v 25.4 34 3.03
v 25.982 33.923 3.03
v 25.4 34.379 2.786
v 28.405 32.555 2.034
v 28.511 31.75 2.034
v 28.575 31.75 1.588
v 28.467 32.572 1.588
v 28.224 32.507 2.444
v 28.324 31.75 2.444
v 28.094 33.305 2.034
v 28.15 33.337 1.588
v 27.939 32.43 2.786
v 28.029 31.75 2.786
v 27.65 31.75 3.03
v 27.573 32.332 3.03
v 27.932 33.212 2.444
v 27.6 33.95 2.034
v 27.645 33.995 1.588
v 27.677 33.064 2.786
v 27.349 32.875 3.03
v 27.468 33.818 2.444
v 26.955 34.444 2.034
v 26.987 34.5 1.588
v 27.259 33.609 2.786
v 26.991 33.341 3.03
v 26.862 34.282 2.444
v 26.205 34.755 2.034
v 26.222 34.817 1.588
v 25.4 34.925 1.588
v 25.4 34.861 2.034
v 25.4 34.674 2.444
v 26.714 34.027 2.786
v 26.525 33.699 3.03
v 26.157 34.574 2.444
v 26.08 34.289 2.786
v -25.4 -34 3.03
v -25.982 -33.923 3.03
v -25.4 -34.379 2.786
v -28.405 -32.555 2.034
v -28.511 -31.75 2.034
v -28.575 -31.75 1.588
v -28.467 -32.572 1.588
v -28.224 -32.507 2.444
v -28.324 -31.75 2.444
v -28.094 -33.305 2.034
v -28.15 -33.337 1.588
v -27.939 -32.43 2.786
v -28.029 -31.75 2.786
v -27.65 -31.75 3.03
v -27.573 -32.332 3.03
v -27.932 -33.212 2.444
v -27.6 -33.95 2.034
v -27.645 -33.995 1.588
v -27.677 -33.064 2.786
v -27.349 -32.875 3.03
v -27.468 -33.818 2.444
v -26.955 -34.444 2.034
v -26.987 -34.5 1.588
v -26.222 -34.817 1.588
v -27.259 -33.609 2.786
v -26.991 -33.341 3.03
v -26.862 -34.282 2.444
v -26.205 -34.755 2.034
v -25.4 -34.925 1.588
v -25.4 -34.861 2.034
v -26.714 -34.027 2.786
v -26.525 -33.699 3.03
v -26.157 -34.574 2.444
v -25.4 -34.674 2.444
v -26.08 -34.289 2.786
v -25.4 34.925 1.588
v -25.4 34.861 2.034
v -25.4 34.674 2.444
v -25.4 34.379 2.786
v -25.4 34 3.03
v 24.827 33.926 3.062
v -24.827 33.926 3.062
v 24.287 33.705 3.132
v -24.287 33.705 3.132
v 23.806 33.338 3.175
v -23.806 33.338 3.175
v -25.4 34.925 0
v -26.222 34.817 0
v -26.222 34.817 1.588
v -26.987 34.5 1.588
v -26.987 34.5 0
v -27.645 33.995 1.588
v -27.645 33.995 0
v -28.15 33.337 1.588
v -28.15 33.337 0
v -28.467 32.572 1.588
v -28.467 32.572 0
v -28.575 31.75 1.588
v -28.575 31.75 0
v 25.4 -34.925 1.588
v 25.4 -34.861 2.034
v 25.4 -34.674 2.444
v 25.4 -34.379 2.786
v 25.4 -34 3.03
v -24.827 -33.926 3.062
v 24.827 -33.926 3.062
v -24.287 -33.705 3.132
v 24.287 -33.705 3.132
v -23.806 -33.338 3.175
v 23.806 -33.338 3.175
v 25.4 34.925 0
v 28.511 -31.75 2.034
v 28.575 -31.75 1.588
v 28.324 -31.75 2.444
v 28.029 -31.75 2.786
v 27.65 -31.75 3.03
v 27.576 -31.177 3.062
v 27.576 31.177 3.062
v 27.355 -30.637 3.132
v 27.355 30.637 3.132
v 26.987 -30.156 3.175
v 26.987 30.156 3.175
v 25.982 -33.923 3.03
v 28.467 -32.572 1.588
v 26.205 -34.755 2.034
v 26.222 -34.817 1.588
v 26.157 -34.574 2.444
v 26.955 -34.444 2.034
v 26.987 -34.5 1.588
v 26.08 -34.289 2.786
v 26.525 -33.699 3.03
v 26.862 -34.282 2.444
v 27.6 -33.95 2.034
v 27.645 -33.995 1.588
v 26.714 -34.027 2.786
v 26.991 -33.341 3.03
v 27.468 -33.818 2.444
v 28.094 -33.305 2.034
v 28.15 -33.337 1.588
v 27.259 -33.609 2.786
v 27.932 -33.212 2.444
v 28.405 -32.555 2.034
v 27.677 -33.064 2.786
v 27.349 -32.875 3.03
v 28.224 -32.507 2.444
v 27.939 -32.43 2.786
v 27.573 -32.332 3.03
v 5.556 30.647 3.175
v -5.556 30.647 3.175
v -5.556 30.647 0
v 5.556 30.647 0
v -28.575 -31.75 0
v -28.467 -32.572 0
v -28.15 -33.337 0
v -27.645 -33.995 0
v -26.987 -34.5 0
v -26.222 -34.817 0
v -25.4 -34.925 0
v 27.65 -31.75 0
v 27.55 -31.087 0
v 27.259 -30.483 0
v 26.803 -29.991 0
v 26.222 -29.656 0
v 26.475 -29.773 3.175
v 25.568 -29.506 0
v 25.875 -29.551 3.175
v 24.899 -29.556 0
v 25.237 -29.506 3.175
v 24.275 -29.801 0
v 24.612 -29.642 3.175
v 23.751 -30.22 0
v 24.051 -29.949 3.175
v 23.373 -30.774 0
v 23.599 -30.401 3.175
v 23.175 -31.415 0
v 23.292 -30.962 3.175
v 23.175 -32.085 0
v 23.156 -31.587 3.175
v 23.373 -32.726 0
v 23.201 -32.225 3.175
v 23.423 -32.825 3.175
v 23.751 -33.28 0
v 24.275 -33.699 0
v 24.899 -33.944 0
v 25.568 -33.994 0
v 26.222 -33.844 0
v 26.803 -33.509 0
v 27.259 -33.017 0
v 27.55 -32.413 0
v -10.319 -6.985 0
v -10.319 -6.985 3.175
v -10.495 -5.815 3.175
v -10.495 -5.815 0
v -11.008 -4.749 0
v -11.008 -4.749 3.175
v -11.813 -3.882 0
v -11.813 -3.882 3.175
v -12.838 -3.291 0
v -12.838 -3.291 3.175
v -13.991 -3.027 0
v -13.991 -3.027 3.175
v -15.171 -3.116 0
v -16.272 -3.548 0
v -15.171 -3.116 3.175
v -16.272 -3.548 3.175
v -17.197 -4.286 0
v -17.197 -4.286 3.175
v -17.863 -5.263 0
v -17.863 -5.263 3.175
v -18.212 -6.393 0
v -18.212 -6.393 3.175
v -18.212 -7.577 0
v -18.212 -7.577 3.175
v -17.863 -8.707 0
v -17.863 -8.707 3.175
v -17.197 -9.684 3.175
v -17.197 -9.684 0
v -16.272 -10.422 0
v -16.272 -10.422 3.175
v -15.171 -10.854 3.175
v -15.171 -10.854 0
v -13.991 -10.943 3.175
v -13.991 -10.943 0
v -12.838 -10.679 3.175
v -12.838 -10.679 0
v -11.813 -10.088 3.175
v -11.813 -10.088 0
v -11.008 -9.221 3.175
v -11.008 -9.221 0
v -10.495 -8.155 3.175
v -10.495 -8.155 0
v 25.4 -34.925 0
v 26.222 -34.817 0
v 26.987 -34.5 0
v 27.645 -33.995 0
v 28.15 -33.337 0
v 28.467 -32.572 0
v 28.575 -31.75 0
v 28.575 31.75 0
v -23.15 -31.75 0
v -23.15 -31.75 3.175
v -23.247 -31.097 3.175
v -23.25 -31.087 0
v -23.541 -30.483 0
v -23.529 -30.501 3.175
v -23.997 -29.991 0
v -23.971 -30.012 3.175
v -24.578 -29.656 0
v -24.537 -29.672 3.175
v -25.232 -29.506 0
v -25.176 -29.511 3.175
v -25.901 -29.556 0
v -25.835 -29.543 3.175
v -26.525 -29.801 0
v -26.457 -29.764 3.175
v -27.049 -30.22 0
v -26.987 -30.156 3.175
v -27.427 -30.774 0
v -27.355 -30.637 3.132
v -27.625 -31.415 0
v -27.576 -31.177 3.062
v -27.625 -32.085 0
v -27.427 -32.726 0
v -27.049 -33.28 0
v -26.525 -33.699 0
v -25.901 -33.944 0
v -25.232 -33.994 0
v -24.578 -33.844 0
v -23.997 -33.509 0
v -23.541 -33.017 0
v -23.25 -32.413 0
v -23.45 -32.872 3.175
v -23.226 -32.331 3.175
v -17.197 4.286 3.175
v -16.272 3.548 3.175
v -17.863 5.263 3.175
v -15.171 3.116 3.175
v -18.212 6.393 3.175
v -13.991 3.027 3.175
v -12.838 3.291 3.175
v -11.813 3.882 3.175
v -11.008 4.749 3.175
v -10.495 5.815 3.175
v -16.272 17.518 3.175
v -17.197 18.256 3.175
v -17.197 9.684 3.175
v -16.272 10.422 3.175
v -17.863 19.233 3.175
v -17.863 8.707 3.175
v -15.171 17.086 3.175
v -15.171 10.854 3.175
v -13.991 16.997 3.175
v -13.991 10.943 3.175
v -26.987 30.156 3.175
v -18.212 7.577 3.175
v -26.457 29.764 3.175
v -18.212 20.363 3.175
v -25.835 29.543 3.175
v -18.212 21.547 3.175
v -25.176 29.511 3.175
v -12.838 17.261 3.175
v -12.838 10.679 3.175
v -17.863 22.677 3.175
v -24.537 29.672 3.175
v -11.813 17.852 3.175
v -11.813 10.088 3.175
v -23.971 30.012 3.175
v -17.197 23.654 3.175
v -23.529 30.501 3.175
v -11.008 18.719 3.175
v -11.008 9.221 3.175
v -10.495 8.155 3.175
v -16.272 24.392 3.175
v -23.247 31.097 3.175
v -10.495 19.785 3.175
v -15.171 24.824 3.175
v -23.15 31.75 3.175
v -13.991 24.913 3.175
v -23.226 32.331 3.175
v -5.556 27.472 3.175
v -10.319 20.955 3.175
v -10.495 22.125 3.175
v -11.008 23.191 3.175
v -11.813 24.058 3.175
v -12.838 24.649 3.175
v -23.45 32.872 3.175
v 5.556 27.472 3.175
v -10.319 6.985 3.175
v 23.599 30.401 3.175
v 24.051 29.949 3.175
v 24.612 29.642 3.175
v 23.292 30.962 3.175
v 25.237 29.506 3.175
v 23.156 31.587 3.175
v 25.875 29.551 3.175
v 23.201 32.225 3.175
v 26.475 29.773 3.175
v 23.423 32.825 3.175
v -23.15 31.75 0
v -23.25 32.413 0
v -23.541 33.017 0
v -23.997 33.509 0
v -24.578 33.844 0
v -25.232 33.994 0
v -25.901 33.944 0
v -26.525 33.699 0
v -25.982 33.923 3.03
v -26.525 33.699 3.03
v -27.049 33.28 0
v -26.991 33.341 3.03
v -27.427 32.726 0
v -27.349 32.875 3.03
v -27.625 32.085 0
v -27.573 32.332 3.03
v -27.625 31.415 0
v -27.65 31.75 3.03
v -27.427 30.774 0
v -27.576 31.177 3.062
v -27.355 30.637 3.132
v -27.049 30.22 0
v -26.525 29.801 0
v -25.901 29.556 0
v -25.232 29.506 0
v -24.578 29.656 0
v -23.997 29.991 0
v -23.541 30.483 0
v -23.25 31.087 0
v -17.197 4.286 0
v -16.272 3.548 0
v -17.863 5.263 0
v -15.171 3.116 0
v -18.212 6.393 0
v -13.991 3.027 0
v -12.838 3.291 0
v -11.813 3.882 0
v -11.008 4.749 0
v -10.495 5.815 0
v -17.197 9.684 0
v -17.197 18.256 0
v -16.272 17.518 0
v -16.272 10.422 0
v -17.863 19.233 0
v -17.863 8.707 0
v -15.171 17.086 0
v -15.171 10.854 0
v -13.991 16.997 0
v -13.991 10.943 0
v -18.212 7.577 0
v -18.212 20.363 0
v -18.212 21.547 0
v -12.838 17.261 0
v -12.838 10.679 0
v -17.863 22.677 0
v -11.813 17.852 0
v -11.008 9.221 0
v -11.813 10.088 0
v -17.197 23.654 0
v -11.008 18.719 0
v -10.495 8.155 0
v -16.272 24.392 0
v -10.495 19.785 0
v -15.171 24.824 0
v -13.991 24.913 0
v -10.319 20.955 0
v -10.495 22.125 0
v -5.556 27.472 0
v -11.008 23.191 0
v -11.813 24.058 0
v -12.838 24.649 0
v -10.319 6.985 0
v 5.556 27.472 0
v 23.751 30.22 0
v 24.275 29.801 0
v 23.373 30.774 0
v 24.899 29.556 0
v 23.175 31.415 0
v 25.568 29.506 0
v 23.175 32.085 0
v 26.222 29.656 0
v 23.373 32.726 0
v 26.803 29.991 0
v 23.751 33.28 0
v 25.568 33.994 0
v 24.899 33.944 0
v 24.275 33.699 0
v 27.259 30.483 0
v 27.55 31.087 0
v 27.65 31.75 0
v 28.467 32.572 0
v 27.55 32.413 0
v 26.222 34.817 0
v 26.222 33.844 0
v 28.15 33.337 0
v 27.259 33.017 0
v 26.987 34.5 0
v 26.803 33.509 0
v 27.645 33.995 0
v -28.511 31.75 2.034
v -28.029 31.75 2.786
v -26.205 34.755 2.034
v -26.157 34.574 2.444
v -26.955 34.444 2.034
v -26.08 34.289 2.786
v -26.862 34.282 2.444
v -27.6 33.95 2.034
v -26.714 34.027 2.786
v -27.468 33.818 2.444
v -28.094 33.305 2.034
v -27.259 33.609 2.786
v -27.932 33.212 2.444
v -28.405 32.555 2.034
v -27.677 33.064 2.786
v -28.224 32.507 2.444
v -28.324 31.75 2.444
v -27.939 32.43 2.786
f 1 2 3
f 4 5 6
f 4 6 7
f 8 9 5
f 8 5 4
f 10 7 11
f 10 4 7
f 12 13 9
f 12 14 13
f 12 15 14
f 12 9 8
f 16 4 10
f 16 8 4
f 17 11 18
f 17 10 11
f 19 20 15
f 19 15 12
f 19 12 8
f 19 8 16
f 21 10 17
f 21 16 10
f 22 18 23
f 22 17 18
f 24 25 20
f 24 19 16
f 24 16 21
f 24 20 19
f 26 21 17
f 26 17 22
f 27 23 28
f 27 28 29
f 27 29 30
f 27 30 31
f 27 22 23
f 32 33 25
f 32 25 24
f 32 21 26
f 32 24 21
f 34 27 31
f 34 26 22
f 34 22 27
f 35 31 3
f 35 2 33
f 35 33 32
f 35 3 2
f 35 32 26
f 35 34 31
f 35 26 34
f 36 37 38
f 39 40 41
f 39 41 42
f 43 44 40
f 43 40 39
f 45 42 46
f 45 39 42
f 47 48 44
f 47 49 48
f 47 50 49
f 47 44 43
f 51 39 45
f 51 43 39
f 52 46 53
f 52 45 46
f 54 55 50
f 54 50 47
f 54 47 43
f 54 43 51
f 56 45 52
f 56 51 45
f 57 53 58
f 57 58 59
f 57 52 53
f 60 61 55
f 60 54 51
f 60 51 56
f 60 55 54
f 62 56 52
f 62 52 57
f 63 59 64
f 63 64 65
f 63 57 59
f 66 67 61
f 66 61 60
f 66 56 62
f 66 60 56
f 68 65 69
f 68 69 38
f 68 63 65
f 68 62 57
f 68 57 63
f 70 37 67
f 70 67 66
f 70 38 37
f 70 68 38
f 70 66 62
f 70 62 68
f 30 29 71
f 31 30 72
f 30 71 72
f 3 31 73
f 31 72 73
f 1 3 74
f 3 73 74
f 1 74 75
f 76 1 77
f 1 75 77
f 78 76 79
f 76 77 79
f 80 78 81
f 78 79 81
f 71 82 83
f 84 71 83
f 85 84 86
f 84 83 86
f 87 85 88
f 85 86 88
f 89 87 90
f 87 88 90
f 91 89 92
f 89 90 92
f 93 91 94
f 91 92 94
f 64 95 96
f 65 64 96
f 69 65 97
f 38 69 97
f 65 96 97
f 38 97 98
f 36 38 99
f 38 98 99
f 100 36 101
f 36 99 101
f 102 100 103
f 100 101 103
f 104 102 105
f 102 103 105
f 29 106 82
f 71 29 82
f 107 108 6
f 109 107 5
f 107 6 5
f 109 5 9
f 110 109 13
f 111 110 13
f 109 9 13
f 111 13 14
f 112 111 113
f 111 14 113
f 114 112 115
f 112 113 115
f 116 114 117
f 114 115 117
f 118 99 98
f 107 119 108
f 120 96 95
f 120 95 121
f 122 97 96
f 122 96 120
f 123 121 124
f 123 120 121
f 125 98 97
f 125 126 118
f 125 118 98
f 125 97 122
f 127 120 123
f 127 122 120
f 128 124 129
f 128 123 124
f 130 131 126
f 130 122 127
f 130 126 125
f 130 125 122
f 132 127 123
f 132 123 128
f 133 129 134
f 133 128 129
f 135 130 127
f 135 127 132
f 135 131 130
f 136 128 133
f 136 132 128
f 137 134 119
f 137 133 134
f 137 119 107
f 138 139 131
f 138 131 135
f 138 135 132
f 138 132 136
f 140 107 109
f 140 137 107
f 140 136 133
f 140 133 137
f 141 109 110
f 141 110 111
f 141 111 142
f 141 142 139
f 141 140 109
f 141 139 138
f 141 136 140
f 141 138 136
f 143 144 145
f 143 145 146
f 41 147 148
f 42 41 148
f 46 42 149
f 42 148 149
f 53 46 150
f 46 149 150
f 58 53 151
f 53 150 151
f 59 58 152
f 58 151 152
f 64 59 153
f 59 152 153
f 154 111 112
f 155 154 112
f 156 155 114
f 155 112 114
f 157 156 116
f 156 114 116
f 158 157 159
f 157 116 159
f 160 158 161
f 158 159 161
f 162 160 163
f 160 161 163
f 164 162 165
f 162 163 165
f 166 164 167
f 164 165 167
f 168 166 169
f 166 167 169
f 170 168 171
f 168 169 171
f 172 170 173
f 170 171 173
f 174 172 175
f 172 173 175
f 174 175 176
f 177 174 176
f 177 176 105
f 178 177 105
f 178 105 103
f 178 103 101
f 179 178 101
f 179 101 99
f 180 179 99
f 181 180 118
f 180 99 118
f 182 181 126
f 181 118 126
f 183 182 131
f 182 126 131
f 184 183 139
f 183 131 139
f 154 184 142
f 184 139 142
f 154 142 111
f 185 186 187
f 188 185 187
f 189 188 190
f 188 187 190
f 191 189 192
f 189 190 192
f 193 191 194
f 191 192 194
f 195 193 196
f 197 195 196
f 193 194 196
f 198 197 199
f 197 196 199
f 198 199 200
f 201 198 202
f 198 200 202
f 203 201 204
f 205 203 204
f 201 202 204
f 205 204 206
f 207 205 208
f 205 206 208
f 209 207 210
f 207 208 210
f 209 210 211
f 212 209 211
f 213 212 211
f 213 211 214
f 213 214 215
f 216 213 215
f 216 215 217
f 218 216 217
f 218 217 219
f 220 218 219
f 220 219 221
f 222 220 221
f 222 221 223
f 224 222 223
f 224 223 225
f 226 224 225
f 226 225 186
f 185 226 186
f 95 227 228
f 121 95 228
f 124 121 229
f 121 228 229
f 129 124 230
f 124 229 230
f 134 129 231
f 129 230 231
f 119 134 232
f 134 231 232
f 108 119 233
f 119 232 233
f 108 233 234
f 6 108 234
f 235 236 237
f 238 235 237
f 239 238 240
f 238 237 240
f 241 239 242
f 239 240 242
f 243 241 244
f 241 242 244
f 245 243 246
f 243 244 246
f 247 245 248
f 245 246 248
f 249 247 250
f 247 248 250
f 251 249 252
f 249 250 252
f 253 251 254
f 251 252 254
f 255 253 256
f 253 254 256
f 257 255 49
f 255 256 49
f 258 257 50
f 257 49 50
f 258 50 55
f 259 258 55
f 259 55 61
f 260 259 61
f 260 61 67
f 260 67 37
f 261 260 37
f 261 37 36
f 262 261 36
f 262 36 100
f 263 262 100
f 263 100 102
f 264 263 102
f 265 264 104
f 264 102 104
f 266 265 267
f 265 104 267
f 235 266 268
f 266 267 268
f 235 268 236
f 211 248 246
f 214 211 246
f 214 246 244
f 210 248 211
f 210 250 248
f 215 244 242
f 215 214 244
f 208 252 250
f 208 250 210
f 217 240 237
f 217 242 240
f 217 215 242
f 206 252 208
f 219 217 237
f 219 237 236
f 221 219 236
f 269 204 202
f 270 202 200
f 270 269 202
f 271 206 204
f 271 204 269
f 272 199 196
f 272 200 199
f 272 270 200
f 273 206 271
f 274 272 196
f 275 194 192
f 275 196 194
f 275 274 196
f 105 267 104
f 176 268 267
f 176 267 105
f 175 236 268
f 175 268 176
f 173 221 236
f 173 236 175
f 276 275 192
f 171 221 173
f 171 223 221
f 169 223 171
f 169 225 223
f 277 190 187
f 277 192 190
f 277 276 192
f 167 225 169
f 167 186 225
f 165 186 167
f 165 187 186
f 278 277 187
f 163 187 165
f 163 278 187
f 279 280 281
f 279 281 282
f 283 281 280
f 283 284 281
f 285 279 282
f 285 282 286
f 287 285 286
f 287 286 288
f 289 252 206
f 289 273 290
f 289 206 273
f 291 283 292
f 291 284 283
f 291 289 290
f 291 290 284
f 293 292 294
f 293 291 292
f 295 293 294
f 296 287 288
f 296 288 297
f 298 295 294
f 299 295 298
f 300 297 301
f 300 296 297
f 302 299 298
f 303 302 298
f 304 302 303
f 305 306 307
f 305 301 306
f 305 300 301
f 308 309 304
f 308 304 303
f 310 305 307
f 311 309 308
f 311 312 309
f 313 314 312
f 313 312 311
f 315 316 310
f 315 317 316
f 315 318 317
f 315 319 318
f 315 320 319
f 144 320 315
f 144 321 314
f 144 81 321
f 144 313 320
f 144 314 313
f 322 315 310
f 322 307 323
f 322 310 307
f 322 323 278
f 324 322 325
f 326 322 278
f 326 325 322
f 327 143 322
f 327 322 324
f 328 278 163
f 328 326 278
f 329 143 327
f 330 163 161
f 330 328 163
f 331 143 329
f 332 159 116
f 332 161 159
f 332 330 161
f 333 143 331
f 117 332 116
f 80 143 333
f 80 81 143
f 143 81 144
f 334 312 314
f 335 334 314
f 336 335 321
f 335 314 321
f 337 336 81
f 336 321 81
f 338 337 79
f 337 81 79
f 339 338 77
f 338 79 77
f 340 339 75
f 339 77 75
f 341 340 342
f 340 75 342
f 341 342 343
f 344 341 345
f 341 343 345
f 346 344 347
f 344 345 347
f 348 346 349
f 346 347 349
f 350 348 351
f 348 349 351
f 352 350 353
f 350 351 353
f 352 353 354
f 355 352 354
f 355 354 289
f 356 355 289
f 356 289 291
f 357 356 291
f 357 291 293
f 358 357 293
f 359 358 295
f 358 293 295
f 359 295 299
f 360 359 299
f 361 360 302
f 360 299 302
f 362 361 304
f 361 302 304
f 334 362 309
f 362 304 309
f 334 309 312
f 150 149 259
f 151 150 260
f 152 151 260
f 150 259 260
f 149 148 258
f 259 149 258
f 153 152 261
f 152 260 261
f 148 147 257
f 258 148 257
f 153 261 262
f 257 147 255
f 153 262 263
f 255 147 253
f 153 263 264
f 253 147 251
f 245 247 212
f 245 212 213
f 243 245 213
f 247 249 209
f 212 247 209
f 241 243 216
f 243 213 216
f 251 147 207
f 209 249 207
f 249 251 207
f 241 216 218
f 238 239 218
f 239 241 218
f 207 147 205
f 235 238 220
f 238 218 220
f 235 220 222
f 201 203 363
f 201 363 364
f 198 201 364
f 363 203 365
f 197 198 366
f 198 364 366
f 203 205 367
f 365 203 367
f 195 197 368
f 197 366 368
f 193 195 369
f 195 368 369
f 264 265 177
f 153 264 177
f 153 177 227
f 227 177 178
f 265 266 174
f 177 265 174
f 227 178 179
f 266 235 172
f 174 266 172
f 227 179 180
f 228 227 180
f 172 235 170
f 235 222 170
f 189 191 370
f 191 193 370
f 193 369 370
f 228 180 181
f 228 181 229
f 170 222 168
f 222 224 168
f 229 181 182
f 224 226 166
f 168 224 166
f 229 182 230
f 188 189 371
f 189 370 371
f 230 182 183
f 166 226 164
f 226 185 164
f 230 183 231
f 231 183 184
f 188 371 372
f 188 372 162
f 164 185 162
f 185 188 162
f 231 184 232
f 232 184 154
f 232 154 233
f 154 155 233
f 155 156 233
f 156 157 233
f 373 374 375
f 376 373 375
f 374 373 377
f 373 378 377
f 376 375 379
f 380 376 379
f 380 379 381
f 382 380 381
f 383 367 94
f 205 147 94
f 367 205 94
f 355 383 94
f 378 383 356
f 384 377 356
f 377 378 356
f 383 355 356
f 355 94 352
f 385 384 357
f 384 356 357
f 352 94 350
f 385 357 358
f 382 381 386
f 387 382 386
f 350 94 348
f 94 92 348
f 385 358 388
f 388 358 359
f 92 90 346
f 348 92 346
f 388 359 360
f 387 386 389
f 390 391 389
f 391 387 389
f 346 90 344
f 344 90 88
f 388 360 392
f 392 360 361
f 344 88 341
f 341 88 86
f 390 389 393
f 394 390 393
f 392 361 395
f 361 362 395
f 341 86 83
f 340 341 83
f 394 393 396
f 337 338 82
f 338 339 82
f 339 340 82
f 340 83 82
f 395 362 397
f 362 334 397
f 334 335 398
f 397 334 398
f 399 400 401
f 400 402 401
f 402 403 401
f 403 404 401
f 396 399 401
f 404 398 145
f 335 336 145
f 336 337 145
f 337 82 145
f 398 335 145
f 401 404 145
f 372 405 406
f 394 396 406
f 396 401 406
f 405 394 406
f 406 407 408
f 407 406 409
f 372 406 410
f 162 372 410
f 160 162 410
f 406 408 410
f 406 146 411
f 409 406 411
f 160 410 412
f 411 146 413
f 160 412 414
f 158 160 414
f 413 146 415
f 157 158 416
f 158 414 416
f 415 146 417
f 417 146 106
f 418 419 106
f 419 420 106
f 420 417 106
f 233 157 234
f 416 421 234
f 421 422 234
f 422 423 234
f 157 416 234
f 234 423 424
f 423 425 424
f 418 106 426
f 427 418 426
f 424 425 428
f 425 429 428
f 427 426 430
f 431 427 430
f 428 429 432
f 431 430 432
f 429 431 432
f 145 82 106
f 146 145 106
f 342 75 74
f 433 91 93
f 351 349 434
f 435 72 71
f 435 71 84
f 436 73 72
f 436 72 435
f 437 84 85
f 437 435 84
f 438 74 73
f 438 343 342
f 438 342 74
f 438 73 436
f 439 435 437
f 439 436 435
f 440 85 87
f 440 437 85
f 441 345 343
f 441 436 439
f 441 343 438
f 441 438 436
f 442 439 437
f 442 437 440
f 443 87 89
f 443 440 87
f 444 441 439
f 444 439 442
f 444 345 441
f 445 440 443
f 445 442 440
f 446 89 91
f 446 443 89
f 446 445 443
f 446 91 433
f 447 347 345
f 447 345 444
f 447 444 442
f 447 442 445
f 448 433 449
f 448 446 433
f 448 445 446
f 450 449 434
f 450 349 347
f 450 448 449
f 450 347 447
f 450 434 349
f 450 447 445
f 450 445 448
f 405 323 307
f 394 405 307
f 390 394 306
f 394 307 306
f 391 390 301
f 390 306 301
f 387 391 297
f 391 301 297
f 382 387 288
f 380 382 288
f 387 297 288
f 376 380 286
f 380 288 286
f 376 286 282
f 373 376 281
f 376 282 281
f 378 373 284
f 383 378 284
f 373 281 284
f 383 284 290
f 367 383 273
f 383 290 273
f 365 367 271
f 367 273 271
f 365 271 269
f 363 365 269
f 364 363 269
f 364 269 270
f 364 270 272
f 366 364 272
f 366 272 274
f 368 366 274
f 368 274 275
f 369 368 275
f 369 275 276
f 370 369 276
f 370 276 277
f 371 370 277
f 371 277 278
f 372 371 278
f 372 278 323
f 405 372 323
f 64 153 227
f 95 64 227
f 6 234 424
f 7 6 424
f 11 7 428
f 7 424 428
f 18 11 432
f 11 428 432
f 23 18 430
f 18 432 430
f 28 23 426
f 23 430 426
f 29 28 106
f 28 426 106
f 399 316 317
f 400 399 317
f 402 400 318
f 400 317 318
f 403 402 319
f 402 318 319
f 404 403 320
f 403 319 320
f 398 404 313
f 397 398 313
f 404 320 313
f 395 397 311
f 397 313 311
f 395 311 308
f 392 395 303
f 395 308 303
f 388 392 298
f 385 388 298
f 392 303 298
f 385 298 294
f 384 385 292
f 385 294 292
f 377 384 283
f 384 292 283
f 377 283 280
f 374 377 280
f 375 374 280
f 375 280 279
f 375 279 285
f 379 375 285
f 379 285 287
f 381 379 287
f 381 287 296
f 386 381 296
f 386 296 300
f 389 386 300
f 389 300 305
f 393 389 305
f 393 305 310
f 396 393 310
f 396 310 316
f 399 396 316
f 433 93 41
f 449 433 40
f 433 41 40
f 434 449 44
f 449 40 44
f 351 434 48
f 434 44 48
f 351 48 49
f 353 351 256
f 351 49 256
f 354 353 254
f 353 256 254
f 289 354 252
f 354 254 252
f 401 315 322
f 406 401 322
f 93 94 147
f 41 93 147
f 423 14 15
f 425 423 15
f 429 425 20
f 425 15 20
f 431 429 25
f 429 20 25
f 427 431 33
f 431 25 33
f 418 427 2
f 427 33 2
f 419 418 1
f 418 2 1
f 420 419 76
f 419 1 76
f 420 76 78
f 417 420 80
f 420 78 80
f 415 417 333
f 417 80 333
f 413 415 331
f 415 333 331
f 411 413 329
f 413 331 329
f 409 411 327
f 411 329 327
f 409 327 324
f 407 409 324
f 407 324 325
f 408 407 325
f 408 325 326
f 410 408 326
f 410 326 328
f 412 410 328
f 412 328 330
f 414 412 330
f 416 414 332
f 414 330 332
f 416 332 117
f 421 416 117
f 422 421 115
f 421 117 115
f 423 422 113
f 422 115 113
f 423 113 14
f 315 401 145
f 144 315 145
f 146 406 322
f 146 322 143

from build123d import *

# Parameters (mm, degrees)
F1_DEPTH = 3.175
F2_R     = 1.5875
F3_R     = 2.249995
F4_DEPTH = 3.176
F5_R     = 3.96875
F5_W     = 11.1125
F5_H     = 3.175
F6_DEPTH = 3.176


with BuildPart() as f1:
    # F0 (on Top) → F1 (new body)
    with BuildSketch(Plane.XY):
        with BuildLine():
            Line((25.4, 34.925), (-25.4, 34.925))
            ThreePointArc((-25.4, 34.925), (-27.645064, 33.995064), (-28.575, 31.75))
            Line((-28.575, 31.75), (-28.575, -31.75))
            ThreePointArc((-28.575, -31.75), (-27.645064, -33.995064), (-25.4, -34.925))
            Line((-25.4, -34.925), (25.4, -34.925))
            ThreePointArc((25.4, -34.925), (27.645064, -33.995064), (28.575, -31.75))
            Line((28.575, -31.75), (28.575, 31.75))
            ThreePointArc((28.575, 31.75), (27.645064, 33.995064), (25.4, 34.925))
        make_face()
    extrude(amount=F1_DEPTH)

    # F2
    f2_edges = [f1.edges().sort_by_distance(p)[0] for p in [
        (0, -34.925, 3.175),
        (-28.575, 0, 3.175),
    ]]
    fillet(f2_edges, radius=F2_R)

    # F3 (on face) → F4 (cut, through all)
    with BuildSketch(Plane.XY.offset(3.175)):
        with Locations((-25.4, 31.75)):
            Circle(F3_R)
        with Locations((25.4, 31.75)):
            Circle(F3_R)
        with Locations((25.4, -31.75)):
            Circle(F3_R)
        with Locations((-25.4, -31.75)):
            Circle(F3_R)
    extrude(amount=-F4_DEPTH, mode=Mode.SUBTRACT)

    # F5 (on face) → F6 (cut, through all)
    with BuildSketch(Plane.XY.offset(3.175)):
        with Locations((-14.2875, -6.985)):
            Circle(F5_R)
        with Locations((-14.2875, 6.985)):
            Circle(F5_R)
        with Locations((-14.2875, 20.955)):
            Circle(F5_R)
        with Locations((0, 29.059681)):
            Rectangle(F5_W, F5_H)
    extrude(amount=-F6_DEPTH, mode=Mode.SUBTRACT)


solid = f1.part
